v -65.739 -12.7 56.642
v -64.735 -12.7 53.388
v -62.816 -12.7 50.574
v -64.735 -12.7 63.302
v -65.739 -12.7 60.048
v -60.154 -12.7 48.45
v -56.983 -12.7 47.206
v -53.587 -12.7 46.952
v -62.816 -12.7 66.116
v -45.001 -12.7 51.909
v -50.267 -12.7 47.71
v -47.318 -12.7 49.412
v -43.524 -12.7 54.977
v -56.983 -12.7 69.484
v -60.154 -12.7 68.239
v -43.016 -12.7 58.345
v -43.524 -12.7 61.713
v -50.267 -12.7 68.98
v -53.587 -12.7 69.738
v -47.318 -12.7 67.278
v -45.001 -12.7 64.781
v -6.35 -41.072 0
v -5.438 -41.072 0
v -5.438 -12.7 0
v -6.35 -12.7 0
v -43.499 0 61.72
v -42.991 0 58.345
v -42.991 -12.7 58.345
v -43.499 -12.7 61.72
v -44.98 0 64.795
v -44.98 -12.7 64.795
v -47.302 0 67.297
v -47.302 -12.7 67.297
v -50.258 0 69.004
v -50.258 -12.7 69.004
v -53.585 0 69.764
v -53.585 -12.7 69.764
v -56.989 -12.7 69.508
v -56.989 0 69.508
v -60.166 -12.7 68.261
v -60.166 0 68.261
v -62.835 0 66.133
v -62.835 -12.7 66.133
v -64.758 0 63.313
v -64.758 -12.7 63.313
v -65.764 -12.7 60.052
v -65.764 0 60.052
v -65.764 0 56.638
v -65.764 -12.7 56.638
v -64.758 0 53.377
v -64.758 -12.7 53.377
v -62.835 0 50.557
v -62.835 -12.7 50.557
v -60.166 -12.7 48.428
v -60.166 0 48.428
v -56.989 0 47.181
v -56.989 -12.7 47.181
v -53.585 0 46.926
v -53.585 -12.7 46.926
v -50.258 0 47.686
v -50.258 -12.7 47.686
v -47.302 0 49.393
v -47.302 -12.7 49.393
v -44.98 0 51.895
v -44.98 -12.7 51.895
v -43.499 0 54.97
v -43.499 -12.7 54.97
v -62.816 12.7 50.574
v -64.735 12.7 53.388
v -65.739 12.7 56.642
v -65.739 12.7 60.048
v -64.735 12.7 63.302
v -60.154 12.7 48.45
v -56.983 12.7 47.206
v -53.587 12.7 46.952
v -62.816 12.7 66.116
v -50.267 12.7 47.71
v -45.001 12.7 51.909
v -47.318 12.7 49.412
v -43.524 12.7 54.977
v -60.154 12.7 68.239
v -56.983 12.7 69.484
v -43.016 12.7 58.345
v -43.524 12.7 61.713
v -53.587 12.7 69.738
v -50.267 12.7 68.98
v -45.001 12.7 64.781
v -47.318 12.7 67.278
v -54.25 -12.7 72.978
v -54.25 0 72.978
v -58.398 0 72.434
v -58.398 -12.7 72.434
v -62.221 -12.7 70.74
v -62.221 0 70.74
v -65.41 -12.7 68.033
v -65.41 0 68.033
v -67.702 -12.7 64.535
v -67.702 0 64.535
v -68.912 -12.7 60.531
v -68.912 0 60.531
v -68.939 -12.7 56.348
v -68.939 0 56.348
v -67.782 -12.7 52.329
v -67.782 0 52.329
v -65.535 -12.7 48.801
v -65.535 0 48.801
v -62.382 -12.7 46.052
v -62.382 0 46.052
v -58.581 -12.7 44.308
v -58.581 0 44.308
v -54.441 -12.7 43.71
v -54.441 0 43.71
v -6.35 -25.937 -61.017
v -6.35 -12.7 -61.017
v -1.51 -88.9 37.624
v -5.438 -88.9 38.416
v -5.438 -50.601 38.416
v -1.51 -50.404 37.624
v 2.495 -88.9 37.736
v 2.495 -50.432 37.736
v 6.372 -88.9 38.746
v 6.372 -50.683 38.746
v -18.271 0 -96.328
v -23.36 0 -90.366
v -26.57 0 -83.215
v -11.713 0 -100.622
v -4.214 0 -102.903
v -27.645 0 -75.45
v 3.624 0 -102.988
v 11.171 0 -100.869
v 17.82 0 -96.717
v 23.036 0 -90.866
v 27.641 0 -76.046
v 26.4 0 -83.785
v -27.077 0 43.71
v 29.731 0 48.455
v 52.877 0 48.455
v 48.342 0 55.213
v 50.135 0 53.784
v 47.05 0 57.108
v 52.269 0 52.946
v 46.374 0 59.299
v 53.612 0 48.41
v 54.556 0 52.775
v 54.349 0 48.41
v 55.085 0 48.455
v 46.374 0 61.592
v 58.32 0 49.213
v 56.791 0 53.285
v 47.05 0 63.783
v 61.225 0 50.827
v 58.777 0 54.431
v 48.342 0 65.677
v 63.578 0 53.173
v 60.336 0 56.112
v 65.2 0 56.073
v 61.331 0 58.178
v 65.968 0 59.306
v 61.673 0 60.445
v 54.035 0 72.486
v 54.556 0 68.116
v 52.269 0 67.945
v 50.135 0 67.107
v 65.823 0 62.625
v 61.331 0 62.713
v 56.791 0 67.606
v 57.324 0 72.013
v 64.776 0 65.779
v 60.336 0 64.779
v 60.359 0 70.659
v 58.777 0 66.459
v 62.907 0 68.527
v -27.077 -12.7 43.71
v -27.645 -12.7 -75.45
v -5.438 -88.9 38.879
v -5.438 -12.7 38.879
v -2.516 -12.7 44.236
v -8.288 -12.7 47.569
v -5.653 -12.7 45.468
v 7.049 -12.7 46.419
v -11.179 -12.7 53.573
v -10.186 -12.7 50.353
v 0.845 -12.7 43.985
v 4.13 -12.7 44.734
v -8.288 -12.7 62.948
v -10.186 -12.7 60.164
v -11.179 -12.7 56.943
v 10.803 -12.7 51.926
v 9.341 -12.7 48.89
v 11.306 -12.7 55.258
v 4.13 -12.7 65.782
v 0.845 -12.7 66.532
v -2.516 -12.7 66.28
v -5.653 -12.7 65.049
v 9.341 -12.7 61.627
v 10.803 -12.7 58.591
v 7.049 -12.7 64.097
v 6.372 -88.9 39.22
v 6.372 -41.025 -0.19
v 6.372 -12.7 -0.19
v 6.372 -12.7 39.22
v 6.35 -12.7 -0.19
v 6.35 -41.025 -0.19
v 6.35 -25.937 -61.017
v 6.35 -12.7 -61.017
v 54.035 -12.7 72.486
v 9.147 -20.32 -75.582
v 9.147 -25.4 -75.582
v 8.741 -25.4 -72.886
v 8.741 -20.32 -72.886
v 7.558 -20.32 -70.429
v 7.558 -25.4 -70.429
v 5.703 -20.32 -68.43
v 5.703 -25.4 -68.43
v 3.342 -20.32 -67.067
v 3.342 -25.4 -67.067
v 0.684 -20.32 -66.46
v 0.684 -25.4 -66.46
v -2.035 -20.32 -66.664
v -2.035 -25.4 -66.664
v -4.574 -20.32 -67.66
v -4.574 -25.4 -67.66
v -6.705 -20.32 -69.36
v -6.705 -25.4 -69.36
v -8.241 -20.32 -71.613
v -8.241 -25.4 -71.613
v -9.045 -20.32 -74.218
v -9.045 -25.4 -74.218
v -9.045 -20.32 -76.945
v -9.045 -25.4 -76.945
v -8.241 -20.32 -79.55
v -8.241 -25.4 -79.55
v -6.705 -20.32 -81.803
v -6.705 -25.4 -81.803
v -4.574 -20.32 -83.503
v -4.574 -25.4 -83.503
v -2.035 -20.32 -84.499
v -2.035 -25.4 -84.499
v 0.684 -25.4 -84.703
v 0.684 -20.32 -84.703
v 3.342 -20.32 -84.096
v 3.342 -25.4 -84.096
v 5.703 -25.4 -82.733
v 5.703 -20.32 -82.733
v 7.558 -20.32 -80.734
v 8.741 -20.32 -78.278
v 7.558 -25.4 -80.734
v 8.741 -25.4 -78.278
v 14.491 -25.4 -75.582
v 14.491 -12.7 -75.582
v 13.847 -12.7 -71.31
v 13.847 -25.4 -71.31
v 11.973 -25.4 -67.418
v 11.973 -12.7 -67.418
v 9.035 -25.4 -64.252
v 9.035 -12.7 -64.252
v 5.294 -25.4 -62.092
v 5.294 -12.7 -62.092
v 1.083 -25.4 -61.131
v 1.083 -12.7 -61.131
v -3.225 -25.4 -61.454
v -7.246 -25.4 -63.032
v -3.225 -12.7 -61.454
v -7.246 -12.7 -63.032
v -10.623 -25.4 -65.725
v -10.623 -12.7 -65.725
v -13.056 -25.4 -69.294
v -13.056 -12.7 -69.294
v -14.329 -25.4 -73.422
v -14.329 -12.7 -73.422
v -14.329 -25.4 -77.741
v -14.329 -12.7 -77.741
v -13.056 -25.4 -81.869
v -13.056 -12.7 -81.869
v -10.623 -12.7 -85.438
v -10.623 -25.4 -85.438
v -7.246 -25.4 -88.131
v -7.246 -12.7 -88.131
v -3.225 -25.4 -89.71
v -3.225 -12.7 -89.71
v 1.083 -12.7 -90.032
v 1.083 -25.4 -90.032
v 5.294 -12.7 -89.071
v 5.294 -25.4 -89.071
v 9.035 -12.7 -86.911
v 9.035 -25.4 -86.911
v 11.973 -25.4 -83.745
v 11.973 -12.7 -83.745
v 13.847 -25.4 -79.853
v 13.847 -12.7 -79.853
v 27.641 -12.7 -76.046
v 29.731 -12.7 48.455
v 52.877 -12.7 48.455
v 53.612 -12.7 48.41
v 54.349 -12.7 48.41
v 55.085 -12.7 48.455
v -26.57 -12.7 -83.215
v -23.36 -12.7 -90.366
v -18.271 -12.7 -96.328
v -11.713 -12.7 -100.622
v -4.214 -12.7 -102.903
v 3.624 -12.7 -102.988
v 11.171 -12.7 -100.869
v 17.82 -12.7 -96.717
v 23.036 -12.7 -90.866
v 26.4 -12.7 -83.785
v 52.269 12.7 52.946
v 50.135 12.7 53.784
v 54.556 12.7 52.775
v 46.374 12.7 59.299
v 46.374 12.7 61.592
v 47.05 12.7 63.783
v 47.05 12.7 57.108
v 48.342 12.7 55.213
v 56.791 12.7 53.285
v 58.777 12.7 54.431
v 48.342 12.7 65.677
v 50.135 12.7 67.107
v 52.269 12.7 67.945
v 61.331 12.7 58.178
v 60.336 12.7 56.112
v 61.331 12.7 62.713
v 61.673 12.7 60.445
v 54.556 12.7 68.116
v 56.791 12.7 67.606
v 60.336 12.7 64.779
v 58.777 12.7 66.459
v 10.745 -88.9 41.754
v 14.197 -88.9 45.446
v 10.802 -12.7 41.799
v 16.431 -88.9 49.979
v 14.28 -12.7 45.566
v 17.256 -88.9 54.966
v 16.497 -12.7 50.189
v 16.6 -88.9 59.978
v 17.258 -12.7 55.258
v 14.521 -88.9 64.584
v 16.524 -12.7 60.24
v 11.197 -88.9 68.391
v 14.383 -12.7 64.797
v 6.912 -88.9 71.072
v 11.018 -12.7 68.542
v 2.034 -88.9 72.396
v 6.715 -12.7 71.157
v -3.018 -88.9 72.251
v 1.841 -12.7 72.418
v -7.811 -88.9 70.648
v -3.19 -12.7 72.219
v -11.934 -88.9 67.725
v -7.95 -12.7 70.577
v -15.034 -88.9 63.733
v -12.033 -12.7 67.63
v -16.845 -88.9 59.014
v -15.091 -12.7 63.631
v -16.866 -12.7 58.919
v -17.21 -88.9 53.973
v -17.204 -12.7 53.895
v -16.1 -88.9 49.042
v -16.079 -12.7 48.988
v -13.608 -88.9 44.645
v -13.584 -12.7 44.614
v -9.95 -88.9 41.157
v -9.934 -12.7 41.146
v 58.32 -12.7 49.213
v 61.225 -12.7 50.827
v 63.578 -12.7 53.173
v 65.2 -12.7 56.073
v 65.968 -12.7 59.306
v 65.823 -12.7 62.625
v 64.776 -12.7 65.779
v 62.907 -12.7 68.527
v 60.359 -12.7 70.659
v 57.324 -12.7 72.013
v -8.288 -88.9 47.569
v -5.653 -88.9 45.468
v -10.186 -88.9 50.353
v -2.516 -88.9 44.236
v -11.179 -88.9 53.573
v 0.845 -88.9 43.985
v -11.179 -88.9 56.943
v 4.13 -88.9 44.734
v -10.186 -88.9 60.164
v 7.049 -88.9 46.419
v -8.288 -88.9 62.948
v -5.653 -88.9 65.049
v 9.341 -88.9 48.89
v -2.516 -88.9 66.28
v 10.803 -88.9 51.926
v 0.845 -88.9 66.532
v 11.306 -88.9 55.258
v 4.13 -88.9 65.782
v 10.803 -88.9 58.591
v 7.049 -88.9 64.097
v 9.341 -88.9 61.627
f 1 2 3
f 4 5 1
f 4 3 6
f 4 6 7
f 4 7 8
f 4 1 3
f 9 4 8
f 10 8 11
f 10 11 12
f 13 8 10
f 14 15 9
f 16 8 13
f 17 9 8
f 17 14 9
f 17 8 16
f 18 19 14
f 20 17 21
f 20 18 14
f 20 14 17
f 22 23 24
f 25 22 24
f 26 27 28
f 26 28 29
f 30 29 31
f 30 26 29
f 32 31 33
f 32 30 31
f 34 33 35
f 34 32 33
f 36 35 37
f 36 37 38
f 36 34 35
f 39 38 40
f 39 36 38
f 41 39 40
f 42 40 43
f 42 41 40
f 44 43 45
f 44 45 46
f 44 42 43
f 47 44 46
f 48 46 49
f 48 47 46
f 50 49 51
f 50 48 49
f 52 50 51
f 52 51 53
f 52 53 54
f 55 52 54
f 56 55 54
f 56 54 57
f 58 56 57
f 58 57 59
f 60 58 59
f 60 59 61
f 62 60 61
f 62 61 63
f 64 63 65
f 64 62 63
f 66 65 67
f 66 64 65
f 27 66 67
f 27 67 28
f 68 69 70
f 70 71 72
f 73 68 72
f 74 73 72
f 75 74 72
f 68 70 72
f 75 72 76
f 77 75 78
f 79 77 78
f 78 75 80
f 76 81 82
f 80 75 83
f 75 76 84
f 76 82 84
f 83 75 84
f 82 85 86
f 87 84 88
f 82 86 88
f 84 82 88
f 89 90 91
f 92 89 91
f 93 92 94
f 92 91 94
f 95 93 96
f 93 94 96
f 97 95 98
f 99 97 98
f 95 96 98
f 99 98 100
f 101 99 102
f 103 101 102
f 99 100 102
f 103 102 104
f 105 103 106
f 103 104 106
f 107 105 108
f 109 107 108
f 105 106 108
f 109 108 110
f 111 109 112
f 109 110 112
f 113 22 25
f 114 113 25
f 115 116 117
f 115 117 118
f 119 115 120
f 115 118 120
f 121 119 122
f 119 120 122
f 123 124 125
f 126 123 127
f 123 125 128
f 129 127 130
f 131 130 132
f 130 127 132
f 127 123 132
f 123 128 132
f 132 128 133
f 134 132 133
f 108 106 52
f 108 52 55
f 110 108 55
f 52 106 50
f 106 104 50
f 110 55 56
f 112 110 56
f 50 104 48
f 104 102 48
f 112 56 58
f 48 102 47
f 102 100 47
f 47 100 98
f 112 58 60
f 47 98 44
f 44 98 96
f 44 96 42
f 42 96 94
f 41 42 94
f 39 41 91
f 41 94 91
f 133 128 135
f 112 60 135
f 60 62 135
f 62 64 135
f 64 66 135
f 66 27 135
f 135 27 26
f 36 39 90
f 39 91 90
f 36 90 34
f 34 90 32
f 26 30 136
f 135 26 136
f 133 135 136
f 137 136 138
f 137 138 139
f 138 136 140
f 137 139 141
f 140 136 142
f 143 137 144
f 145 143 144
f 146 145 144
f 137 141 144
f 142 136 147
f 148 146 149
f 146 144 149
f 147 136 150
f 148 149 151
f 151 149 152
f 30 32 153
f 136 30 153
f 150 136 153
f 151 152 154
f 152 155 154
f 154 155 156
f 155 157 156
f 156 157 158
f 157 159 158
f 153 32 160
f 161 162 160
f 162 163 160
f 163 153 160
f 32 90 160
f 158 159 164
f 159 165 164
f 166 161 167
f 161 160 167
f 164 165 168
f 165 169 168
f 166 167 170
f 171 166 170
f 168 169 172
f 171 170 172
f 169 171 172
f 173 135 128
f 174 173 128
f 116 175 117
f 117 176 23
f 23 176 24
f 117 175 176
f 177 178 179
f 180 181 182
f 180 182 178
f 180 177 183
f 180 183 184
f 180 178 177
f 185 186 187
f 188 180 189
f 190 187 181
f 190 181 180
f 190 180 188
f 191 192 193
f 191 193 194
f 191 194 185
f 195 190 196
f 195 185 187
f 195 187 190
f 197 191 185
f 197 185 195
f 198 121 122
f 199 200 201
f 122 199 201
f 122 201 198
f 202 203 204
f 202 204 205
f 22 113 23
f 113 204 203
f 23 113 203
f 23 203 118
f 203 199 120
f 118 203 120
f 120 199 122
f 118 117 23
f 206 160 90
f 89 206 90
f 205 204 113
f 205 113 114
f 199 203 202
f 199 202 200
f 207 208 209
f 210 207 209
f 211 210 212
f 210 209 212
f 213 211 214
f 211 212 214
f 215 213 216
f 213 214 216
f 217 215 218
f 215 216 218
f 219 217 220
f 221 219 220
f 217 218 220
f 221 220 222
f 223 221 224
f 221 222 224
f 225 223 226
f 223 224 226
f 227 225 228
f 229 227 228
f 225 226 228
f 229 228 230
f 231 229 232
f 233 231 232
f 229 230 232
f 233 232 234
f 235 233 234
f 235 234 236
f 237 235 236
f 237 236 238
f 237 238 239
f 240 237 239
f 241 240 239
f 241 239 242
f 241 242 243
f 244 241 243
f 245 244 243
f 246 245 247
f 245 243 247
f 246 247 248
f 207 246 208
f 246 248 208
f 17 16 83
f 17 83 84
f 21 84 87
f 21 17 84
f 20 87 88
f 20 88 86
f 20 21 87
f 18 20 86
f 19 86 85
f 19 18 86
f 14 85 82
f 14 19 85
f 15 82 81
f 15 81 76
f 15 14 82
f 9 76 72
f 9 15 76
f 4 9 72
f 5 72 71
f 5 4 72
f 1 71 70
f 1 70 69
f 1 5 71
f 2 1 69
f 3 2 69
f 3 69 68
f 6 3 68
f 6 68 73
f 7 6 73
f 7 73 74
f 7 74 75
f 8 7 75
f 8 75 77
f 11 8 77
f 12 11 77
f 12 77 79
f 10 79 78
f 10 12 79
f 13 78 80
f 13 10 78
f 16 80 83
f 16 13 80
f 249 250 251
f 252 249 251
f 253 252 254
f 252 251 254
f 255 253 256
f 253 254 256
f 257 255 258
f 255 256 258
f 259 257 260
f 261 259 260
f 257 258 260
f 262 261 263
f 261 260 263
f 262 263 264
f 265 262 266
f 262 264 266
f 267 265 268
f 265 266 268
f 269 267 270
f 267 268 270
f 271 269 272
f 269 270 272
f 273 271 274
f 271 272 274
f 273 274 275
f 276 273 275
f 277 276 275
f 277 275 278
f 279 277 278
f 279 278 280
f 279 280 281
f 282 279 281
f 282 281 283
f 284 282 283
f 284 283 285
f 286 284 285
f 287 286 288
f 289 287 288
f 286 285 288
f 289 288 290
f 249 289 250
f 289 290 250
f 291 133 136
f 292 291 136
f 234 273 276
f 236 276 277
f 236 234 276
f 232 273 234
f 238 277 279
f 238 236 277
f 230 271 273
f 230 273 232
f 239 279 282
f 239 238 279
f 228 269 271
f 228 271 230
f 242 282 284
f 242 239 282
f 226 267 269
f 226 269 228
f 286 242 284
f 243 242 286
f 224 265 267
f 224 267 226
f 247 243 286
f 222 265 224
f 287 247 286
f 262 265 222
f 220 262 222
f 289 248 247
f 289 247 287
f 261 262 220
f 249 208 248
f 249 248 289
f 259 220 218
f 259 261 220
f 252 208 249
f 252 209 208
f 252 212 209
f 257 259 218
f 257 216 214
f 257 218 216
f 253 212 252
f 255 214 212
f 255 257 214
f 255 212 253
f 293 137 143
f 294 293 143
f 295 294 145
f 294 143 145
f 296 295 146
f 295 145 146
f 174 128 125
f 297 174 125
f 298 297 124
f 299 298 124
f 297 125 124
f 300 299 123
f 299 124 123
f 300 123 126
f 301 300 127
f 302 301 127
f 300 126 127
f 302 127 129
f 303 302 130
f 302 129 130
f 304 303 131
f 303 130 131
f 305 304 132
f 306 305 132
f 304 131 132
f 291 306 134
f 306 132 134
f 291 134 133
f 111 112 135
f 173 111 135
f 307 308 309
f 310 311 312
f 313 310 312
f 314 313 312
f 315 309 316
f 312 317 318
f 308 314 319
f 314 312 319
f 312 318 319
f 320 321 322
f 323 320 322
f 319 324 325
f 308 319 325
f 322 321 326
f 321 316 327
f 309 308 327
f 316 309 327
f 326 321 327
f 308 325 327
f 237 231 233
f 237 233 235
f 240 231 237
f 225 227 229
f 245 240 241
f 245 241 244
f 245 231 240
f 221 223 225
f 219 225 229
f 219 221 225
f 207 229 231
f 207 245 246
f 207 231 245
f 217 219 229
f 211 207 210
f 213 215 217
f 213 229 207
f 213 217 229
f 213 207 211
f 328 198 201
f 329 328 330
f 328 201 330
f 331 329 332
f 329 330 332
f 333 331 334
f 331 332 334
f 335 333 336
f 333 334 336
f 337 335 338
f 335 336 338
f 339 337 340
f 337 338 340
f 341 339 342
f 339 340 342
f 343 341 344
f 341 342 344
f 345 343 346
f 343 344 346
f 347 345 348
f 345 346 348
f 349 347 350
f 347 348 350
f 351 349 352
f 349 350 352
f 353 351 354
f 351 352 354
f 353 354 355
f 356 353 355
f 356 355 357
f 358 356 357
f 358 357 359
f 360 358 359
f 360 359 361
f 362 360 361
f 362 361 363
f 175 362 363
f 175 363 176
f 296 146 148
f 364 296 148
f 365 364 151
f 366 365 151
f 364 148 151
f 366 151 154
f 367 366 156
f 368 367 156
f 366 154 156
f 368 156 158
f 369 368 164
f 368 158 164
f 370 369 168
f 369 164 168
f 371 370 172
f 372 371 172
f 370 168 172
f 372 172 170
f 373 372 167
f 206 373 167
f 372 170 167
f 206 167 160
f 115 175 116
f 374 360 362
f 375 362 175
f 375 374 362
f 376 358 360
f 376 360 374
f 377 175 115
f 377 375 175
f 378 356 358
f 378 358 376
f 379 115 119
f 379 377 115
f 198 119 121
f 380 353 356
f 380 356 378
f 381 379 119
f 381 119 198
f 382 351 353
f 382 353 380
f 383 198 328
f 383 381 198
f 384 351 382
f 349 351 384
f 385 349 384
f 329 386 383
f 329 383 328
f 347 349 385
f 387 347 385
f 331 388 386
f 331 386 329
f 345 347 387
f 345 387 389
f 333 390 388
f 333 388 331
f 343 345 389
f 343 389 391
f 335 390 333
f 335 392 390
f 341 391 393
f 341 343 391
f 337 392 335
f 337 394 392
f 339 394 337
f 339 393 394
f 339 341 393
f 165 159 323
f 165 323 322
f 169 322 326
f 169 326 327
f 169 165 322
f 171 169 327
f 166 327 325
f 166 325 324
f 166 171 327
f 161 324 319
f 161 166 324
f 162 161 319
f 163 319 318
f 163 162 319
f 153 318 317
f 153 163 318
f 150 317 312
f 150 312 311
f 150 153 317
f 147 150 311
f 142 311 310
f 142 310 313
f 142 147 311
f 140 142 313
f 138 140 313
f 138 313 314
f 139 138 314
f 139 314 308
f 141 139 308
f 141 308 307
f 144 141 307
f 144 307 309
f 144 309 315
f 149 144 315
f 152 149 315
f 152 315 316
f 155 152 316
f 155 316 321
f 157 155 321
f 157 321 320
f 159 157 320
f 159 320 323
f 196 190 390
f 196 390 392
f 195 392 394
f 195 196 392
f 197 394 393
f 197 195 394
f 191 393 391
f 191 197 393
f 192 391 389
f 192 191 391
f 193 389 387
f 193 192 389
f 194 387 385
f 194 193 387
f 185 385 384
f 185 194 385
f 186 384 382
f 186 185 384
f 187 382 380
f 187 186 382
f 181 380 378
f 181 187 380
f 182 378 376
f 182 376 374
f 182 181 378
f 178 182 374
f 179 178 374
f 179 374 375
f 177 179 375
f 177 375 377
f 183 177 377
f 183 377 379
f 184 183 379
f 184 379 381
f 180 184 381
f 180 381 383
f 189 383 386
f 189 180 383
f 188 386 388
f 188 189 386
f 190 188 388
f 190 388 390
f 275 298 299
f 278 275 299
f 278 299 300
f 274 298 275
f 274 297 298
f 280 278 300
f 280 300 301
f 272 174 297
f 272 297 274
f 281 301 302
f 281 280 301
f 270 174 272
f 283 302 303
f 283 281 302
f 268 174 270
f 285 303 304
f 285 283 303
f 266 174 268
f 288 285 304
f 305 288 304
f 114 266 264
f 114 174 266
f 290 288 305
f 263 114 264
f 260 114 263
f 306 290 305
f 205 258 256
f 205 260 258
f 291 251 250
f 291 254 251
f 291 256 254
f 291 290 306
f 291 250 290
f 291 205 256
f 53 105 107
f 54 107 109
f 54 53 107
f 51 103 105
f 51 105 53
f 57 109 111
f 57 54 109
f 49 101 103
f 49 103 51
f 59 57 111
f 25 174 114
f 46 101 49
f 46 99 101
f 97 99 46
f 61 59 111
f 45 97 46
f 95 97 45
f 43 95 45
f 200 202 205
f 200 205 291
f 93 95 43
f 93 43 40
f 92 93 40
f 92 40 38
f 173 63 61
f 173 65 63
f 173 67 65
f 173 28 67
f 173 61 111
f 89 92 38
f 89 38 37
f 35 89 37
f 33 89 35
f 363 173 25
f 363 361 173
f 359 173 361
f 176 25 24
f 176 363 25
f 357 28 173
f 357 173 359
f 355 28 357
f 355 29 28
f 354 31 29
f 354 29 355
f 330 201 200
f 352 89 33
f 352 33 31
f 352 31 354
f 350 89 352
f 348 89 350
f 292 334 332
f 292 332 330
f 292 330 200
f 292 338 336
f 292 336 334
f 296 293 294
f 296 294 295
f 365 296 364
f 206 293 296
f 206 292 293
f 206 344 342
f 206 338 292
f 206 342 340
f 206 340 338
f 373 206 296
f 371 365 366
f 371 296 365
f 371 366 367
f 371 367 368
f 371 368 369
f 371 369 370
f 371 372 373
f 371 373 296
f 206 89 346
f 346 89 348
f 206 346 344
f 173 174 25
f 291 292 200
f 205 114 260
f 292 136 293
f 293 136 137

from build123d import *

# Parameters (mm, degrees)
F0_R      = 11.4646864728
F1_DEPTH  = 50.8
F2_R      = 7.6921826569
F2_R_2    = 11.4505878211
F3_DEPTH  = 12.7
F4_R      = 14.4912380629
F5_DEPTH  = 12.7
F6_R      = 9.1470525683
F7_DEPTH  = 5.08
F8_W      = 37.8754884005
F8_H      = 61.017408967
F9_DEPTH  = 6.35
F11_DEPTH = 25.4
F12_R     = 11.3055059993
F13_DEPTH = 76.2
F14_R     = 11.4251949319
F15_DEPTH = 25.399999693
F14_R_2   = 7.6921826569


with BuildPart() as f1:
    # F0 (on Front) → F1 (new body)
    with BuildSketch(Plane.XZ):
        with BuildLine():
            ThreePointArc((6.372153759, 39.2197284066), (14.2796308926, 45.5663535356), (17.2581595391, 55.25842309))
            ThreePointArc((17.2581595391, 55.25842309), (-10.0993134032, 69.2529913027), (-5.4381122177, 38.879442469))
            ThreePointArc((-5.4381122177, 38.879442469), (0.4970483176, 38.0074227234), (6.372153759, 39.2197284066))
        make_face()
        with Locations((0, 55.25842309)):
            Circle(F0_R, mode=Mode.SUBTRACT)
        with BuildLine():
            ThreePointArc((6.372153759, 39.2197284066), (0.4970483176, 38.0074227234), (-5.4381122177, 38.879442469))
            Line((-5.4381122177, 38.879442469), (-5.4381122177, 0))
            Line((-5.4381122177, 0), (6.372153759, -0.1903772354))
            Line((6.372153759, -0.1903772354), (6.372153759, 39.2197284066))
        make_face()
    extrude(amount=F1_DEPTH)

    # F2 (on Front) → F3 (join)
    with BuildSketch(Plane.XZ):
        with BuildLine():
            Line((55.0845707295, 48.4548578139), (52.8769489344, 48.4548578139))
            ThreePointArc((52.8769489344, 48.4548578139), (53.980759832, 48.4041581776), (55.0845707295, 48.4548578139))
        make_face()
        with BuildLine():
            Line((29.7309527334, 48.4548578139), (52.8769489344, 48.4548578139))
            Line((52.8769489344, 48.4548578139), (55.0845707295, 48.4548578139))
            ThreePointArc((55.0845707295, 48.4548578139), (66.0105020427, 60.970531616), (54.0354427804, 72.486434596))
            Line((54.0354427804, 72.486434596), (-54.2504357967, 72.9782005358))
            ThreePointArc((-54.2504357967, 72.9782005358), (-44.0257694858, 68.6254526192), (-39.8066245819, 58.3449355177))
            ThreePointArc((-39.8066245819, 58.3449355177), (-44.0929725749, 47.9967760339), (-54.4411320434, 43.710428004))
            Line((-54.4411320434, 43.710428004), (-27.0771056716, 43.710428004))
            Line((-27.0771056716, 43.710428004), (-27.6445374292, -75.4500131968))
            ThreePointArc((-27.6445374292, -75.4500131968), (0.0658210413, -47.9368824022), (27.6448508626, -75.5816549063))
            ThreePointArc((27.6448508626, -75.5816549063), (27.6438772461, -75.8136678655), (27.6409564655, -76.0456644823))
            Line((27.6409564655, -76.0456644823), (29.7309527334, 48.4548578139))
        make_face()
        with Locations((53.980759832, 60.4453584704)):
            Circle(F2_R, mode=Mode.SUBTRACT)
        with BuildLine():
            ThreePointArc((-27.6445374292, -75.4500131968), (-0.2978310248, -103.2249013852), (27.6409564655, -76.0456644823))
            ThreePointArc((27.6409564655, -76.0456644823), (27.6438772461, -75.8136678655), (27.6448508626, -75.5816549063))
            ThreePointArc((27.6448508626, -75.5816549063), (0.0658210413, -47.9368824022), (-27.6445374292, -75.4500131968))
        make_face()
        with BuildLine():
            ThreePointArc((-39.8066245819, 58.3449355177), (-44.0257694858, 68.6254526192), (-54.2504357967, 72.9782005358))
            ThreePointArc((-54.2504357967, 72.9782005358), (-69.0753289823, 58.4402856649), (-54.4411320434, 43.710428004))
            ThreePointArc((-54.4411320434, 43.710428004), (-44.0929725749, 47.9967760339), (-39.8066245819, 58.3449355177))
        make_face()
        with Locations((-54.4411320956, 58.3449355177)):
            Circle(F2_R_2, mode=Mode.SUBTRACT)
    extrude(amount=F3_DEPTH)

    # F4 (on face) → F5 (join)
    with BuildSketch(Plane.XZ.offset(12.7)):
        with Locations((0, -75.5816549063)):
            Circle(F4_R)
    extrude(amount=F5_DEPTH)

    # F6 (on face) → F7 (cut)
    with BuildSketch(Plane.XZ.offset(25.4)):
        with Locations((0, -75.5816549063)):
            Circle(F6_R)
    extrude(amount=-F7_DEPTH, mode=Mode.SUBTRACT)

    # F8 (on Right) → F9 (join, symmetric)
    with BuildSketch(Plane.YZ):
        with Locations((-31.5472260118, -30.5087044835)):
            Rectangle(F8_W, F8_H)
    extrude(amount=F9_DEPTH, both=True)

    # F10 (on face) → F11 (cut)
    with BuildSketch(Plane.YZ.offset(6.372153759)):
        Polygon((-50.99350214, -61.8221014738), (-25.8801653981, -61.2469762564), (-41.0246886913, -0.1903772354), (-50.8, -0.1903772354), (-50.8, 39.2197284066), align=None)
        Polygon((-50.8, -0.1903772354), (-41.0246886913, -0.1903772354), (-50.8, 39.2197284066), align=None)
    extrude(amount=-F11_DEPTH, mode=Mode.SUBTRACT)

    # F12 (on face) → F13 (join)
    with BuildSketch(Plane.XZ.offset(12.7)):
        with BuildLine():
            ThreePointArc((-5.4381122177, 38.4155431335), (0.4954319648, 37.566328333), (6.372153759, 38.7462661687))
            Line((6.372153759, 38.7462661687), (6.372153759, 39.2197284066))
            ThreePointArc((6.372153759, 39.2197284066), (-0.4970483176, 72.5094234565), (-5.4381122177, 38.879442469))
            Line((-5.4381122177, 38.879442469), (-5.4381122177, 38.4155431335))
        make_face()
        with Locations((0, 55.25842309)):
            Circle(F12_R, mode=Mode.SUBTRACT)
    extrude(amount=F13_DEPTH)

    # F14 (on face) → F15, piece 2 (join)
    with BuildSketch(Plane.XZ.offset(12.7)):
        with Locations((53.980759832, 60.4453584704)):
            Circle(F14_R_2)
    extrude(amount=-F15_DEPTH)


with BuildPart() as f15:
    # F14 (on face) → F15 (new body)
    with BuildSketch(Plane.XZ.offset(12.7)):
        with Locations((-54.4411320956, 58.3449355177)):
            Circle(F14_R)
    extrude(amount=-F15_DEPTH)


solid = Compound([f1.part, f15.part])
